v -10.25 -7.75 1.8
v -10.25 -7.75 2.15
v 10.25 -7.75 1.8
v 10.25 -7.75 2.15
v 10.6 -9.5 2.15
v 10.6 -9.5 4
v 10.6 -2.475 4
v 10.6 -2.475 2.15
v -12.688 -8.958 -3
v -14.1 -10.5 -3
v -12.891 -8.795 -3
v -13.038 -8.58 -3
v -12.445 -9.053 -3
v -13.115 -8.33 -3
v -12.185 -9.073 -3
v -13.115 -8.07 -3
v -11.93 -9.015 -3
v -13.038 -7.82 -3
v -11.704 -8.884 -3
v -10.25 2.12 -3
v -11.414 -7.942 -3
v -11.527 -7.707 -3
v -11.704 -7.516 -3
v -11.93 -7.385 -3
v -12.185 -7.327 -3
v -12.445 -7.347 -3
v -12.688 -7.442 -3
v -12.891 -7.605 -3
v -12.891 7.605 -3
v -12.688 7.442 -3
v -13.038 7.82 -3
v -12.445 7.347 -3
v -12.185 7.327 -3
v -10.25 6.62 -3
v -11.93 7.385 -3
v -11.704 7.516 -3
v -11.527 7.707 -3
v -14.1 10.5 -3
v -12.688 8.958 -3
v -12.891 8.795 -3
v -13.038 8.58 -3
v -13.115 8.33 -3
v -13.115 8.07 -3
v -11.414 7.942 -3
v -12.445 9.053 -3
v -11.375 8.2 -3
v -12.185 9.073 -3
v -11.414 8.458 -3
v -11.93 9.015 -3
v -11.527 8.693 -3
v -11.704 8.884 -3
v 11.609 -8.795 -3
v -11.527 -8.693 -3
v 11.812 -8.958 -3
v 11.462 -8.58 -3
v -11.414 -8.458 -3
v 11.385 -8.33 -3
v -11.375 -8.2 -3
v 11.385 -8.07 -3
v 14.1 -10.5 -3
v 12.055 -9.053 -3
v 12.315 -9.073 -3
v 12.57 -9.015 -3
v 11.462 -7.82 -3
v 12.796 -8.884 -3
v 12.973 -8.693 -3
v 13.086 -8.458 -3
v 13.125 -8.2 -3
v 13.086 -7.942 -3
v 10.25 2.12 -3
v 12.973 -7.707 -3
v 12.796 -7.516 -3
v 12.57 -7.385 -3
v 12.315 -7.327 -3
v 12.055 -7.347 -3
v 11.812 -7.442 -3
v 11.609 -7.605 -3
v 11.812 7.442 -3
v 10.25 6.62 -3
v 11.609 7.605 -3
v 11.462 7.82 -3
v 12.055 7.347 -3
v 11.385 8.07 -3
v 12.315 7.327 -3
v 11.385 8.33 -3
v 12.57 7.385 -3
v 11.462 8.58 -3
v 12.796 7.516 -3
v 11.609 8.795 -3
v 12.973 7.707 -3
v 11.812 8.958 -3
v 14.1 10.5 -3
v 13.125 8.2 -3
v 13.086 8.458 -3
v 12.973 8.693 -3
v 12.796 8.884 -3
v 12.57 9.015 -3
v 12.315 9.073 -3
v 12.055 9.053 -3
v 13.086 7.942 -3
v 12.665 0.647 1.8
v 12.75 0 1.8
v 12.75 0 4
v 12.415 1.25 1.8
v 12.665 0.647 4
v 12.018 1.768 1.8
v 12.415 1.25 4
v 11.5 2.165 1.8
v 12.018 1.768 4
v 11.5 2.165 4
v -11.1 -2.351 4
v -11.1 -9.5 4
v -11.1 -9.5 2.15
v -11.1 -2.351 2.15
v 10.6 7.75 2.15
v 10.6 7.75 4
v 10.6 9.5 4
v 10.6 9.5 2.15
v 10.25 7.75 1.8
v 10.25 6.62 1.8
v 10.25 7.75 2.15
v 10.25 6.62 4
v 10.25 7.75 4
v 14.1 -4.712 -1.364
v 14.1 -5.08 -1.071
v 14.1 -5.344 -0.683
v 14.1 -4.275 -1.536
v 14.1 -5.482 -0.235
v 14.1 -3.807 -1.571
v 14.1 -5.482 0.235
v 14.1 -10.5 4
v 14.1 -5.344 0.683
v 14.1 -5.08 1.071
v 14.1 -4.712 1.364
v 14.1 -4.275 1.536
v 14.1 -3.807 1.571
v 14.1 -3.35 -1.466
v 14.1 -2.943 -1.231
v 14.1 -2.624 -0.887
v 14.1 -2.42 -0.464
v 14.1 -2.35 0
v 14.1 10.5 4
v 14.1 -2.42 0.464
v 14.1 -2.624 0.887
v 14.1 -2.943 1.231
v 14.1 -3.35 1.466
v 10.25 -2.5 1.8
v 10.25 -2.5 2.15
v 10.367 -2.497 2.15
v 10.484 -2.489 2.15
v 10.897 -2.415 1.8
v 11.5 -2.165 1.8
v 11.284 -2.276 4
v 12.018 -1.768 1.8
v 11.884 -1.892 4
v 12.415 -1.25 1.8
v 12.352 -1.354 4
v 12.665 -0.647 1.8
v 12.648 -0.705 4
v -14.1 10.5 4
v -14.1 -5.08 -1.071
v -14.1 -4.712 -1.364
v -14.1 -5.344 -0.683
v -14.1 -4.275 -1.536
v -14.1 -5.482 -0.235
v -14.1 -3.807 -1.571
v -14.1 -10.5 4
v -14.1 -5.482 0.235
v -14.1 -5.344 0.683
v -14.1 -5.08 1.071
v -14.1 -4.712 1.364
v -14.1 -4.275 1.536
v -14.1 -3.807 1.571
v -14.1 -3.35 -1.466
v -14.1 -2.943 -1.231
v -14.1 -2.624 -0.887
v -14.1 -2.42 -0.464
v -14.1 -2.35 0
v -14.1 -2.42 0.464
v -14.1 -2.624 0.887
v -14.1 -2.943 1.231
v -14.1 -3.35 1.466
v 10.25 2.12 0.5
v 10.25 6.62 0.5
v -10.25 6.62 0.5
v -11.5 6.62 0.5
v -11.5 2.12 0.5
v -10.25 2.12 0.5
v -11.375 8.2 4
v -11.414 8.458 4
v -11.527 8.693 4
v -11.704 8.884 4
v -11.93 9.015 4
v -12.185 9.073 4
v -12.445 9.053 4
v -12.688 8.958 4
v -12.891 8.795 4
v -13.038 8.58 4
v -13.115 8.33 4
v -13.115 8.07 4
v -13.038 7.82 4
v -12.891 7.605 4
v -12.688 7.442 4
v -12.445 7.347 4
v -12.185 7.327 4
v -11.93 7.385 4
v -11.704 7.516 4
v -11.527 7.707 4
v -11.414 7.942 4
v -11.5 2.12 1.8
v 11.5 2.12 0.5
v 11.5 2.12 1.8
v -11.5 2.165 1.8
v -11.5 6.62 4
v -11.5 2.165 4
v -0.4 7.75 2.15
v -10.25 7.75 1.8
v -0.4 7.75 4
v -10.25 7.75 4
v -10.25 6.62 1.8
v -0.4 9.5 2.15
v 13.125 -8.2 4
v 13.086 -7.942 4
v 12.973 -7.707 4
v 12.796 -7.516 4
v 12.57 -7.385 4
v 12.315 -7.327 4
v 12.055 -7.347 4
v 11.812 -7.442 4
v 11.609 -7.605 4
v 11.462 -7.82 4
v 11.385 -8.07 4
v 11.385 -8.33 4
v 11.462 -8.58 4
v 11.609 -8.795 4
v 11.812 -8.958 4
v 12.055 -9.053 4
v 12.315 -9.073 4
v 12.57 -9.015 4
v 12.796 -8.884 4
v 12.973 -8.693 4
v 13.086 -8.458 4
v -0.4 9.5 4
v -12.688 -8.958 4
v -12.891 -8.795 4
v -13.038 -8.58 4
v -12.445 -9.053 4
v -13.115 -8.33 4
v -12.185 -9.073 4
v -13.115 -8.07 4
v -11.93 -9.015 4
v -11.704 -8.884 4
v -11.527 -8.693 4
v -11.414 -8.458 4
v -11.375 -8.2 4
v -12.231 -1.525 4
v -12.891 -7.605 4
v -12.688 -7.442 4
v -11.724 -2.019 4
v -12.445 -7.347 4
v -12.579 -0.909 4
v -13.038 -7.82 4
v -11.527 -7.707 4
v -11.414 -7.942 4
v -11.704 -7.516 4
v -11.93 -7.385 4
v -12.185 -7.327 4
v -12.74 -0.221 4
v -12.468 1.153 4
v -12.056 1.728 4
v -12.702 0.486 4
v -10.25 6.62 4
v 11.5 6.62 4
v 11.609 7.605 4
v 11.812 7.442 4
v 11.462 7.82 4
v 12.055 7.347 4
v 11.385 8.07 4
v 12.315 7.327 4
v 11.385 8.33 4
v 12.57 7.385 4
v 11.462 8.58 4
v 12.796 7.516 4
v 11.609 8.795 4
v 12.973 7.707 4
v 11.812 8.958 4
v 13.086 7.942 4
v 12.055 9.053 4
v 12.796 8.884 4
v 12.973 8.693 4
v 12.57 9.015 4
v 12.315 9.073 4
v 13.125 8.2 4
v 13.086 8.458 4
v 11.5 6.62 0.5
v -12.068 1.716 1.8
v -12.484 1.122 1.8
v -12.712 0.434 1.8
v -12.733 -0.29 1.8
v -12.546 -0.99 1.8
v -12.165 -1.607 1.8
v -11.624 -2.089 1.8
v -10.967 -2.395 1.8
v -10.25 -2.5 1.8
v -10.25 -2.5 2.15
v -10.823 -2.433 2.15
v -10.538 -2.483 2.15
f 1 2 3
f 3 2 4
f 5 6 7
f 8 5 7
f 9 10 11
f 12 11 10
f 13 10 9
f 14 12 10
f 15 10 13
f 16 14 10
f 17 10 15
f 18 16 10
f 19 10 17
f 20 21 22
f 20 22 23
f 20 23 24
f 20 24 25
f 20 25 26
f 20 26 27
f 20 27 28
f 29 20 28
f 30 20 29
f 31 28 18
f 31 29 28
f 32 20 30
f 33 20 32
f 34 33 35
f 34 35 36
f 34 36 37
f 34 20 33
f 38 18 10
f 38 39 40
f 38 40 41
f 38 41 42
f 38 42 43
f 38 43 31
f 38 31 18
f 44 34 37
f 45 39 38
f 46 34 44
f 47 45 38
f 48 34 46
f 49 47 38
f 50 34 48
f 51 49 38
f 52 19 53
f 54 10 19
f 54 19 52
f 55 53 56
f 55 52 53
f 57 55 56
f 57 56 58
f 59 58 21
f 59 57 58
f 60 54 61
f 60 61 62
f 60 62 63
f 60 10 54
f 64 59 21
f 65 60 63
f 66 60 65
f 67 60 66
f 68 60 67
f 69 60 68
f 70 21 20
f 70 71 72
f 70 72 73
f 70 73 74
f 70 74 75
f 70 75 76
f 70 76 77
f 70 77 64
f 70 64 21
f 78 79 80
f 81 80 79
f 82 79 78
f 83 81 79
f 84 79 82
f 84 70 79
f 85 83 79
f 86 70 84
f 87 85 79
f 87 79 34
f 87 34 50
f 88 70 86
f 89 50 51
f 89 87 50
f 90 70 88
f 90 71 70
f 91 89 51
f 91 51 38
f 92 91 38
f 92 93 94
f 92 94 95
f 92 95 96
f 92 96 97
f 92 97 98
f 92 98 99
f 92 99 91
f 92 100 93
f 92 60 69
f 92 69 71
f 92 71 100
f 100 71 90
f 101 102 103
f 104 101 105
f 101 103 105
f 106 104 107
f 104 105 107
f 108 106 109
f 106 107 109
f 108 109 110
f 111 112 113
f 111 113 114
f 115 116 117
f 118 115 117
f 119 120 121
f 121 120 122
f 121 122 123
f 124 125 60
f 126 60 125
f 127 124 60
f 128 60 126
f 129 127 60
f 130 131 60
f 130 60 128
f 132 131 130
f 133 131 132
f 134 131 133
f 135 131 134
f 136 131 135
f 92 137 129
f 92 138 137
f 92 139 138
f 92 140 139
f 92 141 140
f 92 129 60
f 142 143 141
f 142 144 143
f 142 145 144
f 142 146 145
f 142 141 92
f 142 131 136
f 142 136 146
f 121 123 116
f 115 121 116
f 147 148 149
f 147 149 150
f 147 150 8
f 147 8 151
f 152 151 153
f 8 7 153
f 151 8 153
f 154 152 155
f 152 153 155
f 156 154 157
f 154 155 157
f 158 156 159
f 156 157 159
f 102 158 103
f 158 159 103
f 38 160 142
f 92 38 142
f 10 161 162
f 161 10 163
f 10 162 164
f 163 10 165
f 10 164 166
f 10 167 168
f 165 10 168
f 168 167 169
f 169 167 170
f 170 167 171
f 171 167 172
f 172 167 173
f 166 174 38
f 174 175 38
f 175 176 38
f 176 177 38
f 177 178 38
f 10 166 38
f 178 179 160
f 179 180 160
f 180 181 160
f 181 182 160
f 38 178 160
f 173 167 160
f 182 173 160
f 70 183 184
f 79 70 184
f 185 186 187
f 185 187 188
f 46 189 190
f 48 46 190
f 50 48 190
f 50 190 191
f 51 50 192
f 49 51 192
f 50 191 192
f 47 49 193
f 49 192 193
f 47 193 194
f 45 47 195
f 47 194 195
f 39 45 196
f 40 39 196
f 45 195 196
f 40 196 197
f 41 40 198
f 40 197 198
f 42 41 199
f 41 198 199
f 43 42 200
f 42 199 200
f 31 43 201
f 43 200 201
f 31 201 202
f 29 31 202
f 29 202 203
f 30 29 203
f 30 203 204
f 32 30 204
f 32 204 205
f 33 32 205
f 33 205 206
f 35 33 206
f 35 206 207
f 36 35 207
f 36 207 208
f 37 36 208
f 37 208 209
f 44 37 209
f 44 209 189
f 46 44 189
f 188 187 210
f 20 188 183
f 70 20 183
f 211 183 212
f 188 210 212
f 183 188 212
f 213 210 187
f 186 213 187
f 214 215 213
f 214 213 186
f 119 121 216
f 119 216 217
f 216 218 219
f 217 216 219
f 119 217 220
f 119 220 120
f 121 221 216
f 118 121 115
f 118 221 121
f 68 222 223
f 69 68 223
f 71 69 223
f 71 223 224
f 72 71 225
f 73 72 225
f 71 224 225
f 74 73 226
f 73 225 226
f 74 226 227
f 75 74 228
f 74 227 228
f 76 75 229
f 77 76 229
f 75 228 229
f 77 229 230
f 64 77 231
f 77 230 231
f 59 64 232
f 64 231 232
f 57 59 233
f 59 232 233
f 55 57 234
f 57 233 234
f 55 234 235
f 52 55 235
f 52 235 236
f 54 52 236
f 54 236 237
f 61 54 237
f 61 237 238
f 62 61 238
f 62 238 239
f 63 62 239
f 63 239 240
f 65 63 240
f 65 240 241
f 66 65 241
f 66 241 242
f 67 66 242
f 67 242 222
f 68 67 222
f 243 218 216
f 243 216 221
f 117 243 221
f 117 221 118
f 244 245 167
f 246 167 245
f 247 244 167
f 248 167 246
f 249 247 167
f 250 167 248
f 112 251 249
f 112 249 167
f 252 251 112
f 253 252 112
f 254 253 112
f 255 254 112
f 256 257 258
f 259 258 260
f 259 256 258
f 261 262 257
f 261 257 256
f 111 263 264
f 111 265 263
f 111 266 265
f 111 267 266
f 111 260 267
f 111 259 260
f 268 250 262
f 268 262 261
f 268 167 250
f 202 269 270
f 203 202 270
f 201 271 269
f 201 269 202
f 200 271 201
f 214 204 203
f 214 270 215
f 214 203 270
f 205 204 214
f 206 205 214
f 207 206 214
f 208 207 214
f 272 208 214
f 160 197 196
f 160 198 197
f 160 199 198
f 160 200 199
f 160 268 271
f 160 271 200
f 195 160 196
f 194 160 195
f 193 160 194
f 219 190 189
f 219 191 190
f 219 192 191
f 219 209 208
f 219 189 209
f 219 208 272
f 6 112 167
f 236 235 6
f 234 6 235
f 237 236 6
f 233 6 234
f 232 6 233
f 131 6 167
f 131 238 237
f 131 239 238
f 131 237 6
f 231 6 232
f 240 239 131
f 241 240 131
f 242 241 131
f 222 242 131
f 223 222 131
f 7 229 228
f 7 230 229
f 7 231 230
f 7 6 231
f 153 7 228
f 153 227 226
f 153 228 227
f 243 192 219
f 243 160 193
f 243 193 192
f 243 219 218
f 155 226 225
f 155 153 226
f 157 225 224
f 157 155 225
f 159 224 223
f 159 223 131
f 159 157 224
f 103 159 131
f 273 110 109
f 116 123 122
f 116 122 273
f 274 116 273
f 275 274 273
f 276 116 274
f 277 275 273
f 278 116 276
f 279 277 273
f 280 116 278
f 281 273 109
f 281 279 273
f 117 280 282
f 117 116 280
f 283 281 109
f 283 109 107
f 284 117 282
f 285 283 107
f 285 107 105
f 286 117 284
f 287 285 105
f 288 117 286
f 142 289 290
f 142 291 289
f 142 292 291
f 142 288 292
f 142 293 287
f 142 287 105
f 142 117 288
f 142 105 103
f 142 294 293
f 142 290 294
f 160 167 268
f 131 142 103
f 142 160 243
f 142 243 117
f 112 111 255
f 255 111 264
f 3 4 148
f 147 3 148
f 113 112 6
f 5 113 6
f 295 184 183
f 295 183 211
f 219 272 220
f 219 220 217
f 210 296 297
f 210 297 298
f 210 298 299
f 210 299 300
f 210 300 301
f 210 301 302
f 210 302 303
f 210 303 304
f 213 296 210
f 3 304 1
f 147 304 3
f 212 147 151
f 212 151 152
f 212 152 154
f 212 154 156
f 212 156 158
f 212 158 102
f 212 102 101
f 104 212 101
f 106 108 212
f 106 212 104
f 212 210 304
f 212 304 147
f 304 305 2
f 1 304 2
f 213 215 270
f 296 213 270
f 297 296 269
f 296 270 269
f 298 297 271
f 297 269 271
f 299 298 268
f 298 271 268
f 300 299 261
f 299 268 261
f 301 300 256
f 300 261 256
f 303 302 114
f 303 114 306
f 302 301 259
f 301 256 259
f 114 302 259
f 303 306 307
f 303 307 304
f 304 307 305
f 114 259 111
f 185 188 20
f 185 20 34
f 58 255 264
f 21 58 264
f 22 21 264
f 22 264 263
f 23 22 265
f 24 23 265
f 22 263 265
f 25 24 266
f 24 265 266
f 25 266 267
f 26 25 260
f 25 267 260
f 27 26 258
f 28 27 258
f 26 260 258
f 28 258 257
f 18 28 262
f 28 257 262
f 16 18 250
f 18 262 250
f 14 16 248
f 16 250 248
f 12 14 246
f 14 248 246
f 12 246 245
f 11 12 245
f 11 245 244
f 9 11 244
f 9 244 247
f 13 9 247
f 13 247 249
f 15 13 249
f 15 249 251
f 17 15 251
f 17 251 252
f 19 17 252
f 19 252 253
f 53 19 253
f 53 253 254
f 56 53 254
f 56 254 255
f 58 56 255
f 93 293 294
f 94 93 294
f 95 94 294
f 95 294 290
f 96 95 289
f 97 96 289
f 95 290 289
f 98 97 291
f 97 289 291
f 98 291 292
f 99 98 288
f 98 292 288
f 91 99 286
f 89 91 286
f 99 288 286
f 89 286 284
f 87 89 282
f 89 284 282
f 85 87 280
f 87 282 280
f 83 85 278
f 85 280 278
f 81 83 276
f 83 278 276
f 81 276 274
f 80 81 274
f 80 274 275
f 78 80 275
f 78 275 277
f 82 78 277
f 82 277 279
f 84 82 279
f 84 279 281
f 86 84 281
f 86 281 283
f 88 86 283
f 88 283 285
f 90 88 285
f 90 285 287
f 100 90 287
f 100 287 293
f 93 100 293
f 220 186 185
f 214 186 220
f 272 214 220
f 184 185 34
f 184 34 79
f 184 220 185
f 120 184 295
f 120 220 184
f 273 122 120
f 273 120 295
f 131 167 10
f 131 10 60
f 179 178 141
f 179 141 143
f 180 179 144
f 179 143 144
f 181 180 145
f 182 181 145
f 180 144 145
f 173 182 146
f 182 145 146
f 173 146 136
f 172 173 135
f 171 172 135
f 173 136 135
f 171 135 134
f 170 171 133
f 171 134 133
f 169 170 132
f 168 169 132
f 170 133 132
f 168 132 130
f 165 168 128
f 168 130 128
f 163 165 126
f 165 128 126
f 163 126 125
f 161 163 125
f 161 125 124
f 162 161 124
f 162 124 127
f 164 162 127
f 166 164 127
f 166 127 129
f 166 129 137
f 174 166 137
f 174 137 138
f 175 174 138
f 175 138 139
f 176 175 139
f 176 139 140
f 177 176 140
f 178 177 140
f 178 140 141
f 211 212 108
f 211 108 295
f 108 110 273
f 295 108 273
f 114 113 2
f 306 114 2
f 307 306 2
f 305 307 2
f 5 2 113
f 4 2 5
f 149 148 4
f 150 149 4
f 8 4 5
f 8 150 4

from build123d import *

# Parameters (mm, degrees)
F0_W      = 28.2
F0_H      = 21
F1_DEPTH  = 4
F3_DEPTH  = 2.2
F5_R      = 0.875
F6_DEPTH  = 25
F7_W      = 20.5
F7_H      = 4.5
F8_DEPTH  = 27.5
F9_R      = 1.575
F10_DEPTH = 29
F11_W     = 21
F11_H     = 1
F12_DEPTH = 28.2
F13_W     = 23
F13_H     = 4.5
F14_DEPTH = 3.5
F15_DEPTH = 3
F16_W     = 11
F16_H     = 1.75
F17_DEPTH = 1.85
F18_W     = 21.7
F18_H     = 8
F19_DEPTH = 1.85


# Not quite as in the source:
# - a feature names something its author has since deleted; it is built from what else it names


with BuildPart() as f1:
    # F0 (on Top) → F1 (new body, symmetric)
    with BuildSketch(Plane.XY):
        Rectangle(F0_W, F0_H)
    extrude(amount=F1_DEPTH, both=True)

    # F2 (on face) → F3 (cut)
    with BuildSketch(Plane.XY.offset(4)):
        with BuildLine():
            Line((10.25, 7.75), (-10.25, 7.75))
            Line((-10.25, 7.75), (-10.25, 2.5))
            ThreePointArc((-10.25, 2.5), (-8.482233047, 1.767766953), (-7.75, 0))
            ThreePointArc((-7.75, 0), (-8.482233047, -1.767766953), (-10.25, -2.5))
            Line((-10.25, -2.5), (-10.25, -7.75))
            Line((-10.25, -7.75), (10.25, -7.75))
            Line((10.25, -7.75), (10.25, -2.5))
            ThreePointArc((10.25, -2.5), (7.75, 0), (10.25, 2.5))
            Line((10.25, 2.5), (10.25, 7.75))
        make_face()
        with BuildLine():
            ThreePointArc((-7.75, 0), (-8.482233047, 1.767766953), (-10.25, 2.5))
            Line((-10.25, 2.5), (-10.25, -2.5))
            ThreePointArc((-10.25, -2.5), (-8.482233047, -1.767766953), (-7.75, 0))
        make_face()
        with BuildLine():
            Line((-10.25, -2.5), (-10.25, 2.5))
            ThreePointArc((-10.25, 2.5), (-12.75, 0), (-10.25, -2.5))
        make_face()
        with BuildLine():
            ThreePointArc((12.75, 0), (12.017766953, 1.767766953), (10.25, 2.5))
            Line((10.25, 2.5), (10.25, -2.5))
            ThreePointArc((10.25, -2.5), (12.017766953, -1.767766953), (12.75, 0))
        make_face()
        with BuildLine():
            Line((10.25, -2.5), (10.25, 2.5))
            ThreePointArc((10.25, 2.5), (7.75, 0), (10.25, -2.5))
        make_face()
    extrude(amount=-F3_DEPTH, mode=Mode.SUBTRACT)

    # F5 (on face) → F6 (cut)
    with BuildSketch(Plane.XY.offset(4)):
        with Locations((-12.25, 8.2)):
            Circle(F5_R)
        with Locations((12.25, 8.2)):
            Circle(F5_R)
        with Locations((12.25, -8.2)):
            Circle(F5_R)
        with Locations((-12.25, -8.2)):
            Circle(F5_R)
    extrude(amount=-F6_DEPTH, mode=Mode.SUBTRACT)

    # F7 (on Top) → F8 (cut, symmetric)
    with BuildSketch(Plane.XY):
        with Locations((0, 4.37)):
            Rectangle(F7_W, F7_H)
    extrude(amount=F8_DEPTH, both=True, mode=Mode.SUBTRACT)

    # F9 (on face) → F10 (cut)
    with BuildSketch(Plane.YZ.offset(14.1)):
        with Locations((-3.925, 0)):
            Circle(F9_R)
    extrude(amount=-F10_DEPTH, mode=Mode.SUBTRACT)

    # F11 (on face) → F12 (cut)
    with BuildSketch(Plane.YZ.offset(14.1)):
        with Locations((0, -3.5)):
            Rectangle(F11_W, F11_H)
    extrude(amount=-F12_DEPTH, mode=Mode.SUBTRACT)

    # F13 (on face) → F14 (cut)
    with BuildSketch(Plane.XY.offset(4)):
        with Locations((0, 4.37)):
            Rectangle(F13_W, F13_H)
    extrude(amount=-F14_DEPTH, mode=Mode.SUBTRACT)

    # F13 (on face) → F15 (cut)
    with BuildSketch(Plane.XY.offset(4)):
        with Locations((0, 4.37)):
            Rectangle(F13_W, F13_H)
    extrude(amount=-F15_DEPTH, mode=Mode.SUBTRACT)

    # F16 (on face) → F17 (cut)
    with BuildSketch(Plane.XY.offset(4)):
        with Locations((5.1, 8.625)):
            Rectangle(F16_W, F16_H)
    extrude(amount=-F17_DEPTH, mode=Mode.SUBTRACT)

    # F18 (on face) → F19 (cut)
    with BuildSketch(Plane.XY.offset(4)):
        with Locations((-0.25, -5.5)):
            Rectangle(F18_W, F18_H)
    extrude(amount=-F19_DEPTH, mode=Mode.SUBTRACT)


solid = f1.part
